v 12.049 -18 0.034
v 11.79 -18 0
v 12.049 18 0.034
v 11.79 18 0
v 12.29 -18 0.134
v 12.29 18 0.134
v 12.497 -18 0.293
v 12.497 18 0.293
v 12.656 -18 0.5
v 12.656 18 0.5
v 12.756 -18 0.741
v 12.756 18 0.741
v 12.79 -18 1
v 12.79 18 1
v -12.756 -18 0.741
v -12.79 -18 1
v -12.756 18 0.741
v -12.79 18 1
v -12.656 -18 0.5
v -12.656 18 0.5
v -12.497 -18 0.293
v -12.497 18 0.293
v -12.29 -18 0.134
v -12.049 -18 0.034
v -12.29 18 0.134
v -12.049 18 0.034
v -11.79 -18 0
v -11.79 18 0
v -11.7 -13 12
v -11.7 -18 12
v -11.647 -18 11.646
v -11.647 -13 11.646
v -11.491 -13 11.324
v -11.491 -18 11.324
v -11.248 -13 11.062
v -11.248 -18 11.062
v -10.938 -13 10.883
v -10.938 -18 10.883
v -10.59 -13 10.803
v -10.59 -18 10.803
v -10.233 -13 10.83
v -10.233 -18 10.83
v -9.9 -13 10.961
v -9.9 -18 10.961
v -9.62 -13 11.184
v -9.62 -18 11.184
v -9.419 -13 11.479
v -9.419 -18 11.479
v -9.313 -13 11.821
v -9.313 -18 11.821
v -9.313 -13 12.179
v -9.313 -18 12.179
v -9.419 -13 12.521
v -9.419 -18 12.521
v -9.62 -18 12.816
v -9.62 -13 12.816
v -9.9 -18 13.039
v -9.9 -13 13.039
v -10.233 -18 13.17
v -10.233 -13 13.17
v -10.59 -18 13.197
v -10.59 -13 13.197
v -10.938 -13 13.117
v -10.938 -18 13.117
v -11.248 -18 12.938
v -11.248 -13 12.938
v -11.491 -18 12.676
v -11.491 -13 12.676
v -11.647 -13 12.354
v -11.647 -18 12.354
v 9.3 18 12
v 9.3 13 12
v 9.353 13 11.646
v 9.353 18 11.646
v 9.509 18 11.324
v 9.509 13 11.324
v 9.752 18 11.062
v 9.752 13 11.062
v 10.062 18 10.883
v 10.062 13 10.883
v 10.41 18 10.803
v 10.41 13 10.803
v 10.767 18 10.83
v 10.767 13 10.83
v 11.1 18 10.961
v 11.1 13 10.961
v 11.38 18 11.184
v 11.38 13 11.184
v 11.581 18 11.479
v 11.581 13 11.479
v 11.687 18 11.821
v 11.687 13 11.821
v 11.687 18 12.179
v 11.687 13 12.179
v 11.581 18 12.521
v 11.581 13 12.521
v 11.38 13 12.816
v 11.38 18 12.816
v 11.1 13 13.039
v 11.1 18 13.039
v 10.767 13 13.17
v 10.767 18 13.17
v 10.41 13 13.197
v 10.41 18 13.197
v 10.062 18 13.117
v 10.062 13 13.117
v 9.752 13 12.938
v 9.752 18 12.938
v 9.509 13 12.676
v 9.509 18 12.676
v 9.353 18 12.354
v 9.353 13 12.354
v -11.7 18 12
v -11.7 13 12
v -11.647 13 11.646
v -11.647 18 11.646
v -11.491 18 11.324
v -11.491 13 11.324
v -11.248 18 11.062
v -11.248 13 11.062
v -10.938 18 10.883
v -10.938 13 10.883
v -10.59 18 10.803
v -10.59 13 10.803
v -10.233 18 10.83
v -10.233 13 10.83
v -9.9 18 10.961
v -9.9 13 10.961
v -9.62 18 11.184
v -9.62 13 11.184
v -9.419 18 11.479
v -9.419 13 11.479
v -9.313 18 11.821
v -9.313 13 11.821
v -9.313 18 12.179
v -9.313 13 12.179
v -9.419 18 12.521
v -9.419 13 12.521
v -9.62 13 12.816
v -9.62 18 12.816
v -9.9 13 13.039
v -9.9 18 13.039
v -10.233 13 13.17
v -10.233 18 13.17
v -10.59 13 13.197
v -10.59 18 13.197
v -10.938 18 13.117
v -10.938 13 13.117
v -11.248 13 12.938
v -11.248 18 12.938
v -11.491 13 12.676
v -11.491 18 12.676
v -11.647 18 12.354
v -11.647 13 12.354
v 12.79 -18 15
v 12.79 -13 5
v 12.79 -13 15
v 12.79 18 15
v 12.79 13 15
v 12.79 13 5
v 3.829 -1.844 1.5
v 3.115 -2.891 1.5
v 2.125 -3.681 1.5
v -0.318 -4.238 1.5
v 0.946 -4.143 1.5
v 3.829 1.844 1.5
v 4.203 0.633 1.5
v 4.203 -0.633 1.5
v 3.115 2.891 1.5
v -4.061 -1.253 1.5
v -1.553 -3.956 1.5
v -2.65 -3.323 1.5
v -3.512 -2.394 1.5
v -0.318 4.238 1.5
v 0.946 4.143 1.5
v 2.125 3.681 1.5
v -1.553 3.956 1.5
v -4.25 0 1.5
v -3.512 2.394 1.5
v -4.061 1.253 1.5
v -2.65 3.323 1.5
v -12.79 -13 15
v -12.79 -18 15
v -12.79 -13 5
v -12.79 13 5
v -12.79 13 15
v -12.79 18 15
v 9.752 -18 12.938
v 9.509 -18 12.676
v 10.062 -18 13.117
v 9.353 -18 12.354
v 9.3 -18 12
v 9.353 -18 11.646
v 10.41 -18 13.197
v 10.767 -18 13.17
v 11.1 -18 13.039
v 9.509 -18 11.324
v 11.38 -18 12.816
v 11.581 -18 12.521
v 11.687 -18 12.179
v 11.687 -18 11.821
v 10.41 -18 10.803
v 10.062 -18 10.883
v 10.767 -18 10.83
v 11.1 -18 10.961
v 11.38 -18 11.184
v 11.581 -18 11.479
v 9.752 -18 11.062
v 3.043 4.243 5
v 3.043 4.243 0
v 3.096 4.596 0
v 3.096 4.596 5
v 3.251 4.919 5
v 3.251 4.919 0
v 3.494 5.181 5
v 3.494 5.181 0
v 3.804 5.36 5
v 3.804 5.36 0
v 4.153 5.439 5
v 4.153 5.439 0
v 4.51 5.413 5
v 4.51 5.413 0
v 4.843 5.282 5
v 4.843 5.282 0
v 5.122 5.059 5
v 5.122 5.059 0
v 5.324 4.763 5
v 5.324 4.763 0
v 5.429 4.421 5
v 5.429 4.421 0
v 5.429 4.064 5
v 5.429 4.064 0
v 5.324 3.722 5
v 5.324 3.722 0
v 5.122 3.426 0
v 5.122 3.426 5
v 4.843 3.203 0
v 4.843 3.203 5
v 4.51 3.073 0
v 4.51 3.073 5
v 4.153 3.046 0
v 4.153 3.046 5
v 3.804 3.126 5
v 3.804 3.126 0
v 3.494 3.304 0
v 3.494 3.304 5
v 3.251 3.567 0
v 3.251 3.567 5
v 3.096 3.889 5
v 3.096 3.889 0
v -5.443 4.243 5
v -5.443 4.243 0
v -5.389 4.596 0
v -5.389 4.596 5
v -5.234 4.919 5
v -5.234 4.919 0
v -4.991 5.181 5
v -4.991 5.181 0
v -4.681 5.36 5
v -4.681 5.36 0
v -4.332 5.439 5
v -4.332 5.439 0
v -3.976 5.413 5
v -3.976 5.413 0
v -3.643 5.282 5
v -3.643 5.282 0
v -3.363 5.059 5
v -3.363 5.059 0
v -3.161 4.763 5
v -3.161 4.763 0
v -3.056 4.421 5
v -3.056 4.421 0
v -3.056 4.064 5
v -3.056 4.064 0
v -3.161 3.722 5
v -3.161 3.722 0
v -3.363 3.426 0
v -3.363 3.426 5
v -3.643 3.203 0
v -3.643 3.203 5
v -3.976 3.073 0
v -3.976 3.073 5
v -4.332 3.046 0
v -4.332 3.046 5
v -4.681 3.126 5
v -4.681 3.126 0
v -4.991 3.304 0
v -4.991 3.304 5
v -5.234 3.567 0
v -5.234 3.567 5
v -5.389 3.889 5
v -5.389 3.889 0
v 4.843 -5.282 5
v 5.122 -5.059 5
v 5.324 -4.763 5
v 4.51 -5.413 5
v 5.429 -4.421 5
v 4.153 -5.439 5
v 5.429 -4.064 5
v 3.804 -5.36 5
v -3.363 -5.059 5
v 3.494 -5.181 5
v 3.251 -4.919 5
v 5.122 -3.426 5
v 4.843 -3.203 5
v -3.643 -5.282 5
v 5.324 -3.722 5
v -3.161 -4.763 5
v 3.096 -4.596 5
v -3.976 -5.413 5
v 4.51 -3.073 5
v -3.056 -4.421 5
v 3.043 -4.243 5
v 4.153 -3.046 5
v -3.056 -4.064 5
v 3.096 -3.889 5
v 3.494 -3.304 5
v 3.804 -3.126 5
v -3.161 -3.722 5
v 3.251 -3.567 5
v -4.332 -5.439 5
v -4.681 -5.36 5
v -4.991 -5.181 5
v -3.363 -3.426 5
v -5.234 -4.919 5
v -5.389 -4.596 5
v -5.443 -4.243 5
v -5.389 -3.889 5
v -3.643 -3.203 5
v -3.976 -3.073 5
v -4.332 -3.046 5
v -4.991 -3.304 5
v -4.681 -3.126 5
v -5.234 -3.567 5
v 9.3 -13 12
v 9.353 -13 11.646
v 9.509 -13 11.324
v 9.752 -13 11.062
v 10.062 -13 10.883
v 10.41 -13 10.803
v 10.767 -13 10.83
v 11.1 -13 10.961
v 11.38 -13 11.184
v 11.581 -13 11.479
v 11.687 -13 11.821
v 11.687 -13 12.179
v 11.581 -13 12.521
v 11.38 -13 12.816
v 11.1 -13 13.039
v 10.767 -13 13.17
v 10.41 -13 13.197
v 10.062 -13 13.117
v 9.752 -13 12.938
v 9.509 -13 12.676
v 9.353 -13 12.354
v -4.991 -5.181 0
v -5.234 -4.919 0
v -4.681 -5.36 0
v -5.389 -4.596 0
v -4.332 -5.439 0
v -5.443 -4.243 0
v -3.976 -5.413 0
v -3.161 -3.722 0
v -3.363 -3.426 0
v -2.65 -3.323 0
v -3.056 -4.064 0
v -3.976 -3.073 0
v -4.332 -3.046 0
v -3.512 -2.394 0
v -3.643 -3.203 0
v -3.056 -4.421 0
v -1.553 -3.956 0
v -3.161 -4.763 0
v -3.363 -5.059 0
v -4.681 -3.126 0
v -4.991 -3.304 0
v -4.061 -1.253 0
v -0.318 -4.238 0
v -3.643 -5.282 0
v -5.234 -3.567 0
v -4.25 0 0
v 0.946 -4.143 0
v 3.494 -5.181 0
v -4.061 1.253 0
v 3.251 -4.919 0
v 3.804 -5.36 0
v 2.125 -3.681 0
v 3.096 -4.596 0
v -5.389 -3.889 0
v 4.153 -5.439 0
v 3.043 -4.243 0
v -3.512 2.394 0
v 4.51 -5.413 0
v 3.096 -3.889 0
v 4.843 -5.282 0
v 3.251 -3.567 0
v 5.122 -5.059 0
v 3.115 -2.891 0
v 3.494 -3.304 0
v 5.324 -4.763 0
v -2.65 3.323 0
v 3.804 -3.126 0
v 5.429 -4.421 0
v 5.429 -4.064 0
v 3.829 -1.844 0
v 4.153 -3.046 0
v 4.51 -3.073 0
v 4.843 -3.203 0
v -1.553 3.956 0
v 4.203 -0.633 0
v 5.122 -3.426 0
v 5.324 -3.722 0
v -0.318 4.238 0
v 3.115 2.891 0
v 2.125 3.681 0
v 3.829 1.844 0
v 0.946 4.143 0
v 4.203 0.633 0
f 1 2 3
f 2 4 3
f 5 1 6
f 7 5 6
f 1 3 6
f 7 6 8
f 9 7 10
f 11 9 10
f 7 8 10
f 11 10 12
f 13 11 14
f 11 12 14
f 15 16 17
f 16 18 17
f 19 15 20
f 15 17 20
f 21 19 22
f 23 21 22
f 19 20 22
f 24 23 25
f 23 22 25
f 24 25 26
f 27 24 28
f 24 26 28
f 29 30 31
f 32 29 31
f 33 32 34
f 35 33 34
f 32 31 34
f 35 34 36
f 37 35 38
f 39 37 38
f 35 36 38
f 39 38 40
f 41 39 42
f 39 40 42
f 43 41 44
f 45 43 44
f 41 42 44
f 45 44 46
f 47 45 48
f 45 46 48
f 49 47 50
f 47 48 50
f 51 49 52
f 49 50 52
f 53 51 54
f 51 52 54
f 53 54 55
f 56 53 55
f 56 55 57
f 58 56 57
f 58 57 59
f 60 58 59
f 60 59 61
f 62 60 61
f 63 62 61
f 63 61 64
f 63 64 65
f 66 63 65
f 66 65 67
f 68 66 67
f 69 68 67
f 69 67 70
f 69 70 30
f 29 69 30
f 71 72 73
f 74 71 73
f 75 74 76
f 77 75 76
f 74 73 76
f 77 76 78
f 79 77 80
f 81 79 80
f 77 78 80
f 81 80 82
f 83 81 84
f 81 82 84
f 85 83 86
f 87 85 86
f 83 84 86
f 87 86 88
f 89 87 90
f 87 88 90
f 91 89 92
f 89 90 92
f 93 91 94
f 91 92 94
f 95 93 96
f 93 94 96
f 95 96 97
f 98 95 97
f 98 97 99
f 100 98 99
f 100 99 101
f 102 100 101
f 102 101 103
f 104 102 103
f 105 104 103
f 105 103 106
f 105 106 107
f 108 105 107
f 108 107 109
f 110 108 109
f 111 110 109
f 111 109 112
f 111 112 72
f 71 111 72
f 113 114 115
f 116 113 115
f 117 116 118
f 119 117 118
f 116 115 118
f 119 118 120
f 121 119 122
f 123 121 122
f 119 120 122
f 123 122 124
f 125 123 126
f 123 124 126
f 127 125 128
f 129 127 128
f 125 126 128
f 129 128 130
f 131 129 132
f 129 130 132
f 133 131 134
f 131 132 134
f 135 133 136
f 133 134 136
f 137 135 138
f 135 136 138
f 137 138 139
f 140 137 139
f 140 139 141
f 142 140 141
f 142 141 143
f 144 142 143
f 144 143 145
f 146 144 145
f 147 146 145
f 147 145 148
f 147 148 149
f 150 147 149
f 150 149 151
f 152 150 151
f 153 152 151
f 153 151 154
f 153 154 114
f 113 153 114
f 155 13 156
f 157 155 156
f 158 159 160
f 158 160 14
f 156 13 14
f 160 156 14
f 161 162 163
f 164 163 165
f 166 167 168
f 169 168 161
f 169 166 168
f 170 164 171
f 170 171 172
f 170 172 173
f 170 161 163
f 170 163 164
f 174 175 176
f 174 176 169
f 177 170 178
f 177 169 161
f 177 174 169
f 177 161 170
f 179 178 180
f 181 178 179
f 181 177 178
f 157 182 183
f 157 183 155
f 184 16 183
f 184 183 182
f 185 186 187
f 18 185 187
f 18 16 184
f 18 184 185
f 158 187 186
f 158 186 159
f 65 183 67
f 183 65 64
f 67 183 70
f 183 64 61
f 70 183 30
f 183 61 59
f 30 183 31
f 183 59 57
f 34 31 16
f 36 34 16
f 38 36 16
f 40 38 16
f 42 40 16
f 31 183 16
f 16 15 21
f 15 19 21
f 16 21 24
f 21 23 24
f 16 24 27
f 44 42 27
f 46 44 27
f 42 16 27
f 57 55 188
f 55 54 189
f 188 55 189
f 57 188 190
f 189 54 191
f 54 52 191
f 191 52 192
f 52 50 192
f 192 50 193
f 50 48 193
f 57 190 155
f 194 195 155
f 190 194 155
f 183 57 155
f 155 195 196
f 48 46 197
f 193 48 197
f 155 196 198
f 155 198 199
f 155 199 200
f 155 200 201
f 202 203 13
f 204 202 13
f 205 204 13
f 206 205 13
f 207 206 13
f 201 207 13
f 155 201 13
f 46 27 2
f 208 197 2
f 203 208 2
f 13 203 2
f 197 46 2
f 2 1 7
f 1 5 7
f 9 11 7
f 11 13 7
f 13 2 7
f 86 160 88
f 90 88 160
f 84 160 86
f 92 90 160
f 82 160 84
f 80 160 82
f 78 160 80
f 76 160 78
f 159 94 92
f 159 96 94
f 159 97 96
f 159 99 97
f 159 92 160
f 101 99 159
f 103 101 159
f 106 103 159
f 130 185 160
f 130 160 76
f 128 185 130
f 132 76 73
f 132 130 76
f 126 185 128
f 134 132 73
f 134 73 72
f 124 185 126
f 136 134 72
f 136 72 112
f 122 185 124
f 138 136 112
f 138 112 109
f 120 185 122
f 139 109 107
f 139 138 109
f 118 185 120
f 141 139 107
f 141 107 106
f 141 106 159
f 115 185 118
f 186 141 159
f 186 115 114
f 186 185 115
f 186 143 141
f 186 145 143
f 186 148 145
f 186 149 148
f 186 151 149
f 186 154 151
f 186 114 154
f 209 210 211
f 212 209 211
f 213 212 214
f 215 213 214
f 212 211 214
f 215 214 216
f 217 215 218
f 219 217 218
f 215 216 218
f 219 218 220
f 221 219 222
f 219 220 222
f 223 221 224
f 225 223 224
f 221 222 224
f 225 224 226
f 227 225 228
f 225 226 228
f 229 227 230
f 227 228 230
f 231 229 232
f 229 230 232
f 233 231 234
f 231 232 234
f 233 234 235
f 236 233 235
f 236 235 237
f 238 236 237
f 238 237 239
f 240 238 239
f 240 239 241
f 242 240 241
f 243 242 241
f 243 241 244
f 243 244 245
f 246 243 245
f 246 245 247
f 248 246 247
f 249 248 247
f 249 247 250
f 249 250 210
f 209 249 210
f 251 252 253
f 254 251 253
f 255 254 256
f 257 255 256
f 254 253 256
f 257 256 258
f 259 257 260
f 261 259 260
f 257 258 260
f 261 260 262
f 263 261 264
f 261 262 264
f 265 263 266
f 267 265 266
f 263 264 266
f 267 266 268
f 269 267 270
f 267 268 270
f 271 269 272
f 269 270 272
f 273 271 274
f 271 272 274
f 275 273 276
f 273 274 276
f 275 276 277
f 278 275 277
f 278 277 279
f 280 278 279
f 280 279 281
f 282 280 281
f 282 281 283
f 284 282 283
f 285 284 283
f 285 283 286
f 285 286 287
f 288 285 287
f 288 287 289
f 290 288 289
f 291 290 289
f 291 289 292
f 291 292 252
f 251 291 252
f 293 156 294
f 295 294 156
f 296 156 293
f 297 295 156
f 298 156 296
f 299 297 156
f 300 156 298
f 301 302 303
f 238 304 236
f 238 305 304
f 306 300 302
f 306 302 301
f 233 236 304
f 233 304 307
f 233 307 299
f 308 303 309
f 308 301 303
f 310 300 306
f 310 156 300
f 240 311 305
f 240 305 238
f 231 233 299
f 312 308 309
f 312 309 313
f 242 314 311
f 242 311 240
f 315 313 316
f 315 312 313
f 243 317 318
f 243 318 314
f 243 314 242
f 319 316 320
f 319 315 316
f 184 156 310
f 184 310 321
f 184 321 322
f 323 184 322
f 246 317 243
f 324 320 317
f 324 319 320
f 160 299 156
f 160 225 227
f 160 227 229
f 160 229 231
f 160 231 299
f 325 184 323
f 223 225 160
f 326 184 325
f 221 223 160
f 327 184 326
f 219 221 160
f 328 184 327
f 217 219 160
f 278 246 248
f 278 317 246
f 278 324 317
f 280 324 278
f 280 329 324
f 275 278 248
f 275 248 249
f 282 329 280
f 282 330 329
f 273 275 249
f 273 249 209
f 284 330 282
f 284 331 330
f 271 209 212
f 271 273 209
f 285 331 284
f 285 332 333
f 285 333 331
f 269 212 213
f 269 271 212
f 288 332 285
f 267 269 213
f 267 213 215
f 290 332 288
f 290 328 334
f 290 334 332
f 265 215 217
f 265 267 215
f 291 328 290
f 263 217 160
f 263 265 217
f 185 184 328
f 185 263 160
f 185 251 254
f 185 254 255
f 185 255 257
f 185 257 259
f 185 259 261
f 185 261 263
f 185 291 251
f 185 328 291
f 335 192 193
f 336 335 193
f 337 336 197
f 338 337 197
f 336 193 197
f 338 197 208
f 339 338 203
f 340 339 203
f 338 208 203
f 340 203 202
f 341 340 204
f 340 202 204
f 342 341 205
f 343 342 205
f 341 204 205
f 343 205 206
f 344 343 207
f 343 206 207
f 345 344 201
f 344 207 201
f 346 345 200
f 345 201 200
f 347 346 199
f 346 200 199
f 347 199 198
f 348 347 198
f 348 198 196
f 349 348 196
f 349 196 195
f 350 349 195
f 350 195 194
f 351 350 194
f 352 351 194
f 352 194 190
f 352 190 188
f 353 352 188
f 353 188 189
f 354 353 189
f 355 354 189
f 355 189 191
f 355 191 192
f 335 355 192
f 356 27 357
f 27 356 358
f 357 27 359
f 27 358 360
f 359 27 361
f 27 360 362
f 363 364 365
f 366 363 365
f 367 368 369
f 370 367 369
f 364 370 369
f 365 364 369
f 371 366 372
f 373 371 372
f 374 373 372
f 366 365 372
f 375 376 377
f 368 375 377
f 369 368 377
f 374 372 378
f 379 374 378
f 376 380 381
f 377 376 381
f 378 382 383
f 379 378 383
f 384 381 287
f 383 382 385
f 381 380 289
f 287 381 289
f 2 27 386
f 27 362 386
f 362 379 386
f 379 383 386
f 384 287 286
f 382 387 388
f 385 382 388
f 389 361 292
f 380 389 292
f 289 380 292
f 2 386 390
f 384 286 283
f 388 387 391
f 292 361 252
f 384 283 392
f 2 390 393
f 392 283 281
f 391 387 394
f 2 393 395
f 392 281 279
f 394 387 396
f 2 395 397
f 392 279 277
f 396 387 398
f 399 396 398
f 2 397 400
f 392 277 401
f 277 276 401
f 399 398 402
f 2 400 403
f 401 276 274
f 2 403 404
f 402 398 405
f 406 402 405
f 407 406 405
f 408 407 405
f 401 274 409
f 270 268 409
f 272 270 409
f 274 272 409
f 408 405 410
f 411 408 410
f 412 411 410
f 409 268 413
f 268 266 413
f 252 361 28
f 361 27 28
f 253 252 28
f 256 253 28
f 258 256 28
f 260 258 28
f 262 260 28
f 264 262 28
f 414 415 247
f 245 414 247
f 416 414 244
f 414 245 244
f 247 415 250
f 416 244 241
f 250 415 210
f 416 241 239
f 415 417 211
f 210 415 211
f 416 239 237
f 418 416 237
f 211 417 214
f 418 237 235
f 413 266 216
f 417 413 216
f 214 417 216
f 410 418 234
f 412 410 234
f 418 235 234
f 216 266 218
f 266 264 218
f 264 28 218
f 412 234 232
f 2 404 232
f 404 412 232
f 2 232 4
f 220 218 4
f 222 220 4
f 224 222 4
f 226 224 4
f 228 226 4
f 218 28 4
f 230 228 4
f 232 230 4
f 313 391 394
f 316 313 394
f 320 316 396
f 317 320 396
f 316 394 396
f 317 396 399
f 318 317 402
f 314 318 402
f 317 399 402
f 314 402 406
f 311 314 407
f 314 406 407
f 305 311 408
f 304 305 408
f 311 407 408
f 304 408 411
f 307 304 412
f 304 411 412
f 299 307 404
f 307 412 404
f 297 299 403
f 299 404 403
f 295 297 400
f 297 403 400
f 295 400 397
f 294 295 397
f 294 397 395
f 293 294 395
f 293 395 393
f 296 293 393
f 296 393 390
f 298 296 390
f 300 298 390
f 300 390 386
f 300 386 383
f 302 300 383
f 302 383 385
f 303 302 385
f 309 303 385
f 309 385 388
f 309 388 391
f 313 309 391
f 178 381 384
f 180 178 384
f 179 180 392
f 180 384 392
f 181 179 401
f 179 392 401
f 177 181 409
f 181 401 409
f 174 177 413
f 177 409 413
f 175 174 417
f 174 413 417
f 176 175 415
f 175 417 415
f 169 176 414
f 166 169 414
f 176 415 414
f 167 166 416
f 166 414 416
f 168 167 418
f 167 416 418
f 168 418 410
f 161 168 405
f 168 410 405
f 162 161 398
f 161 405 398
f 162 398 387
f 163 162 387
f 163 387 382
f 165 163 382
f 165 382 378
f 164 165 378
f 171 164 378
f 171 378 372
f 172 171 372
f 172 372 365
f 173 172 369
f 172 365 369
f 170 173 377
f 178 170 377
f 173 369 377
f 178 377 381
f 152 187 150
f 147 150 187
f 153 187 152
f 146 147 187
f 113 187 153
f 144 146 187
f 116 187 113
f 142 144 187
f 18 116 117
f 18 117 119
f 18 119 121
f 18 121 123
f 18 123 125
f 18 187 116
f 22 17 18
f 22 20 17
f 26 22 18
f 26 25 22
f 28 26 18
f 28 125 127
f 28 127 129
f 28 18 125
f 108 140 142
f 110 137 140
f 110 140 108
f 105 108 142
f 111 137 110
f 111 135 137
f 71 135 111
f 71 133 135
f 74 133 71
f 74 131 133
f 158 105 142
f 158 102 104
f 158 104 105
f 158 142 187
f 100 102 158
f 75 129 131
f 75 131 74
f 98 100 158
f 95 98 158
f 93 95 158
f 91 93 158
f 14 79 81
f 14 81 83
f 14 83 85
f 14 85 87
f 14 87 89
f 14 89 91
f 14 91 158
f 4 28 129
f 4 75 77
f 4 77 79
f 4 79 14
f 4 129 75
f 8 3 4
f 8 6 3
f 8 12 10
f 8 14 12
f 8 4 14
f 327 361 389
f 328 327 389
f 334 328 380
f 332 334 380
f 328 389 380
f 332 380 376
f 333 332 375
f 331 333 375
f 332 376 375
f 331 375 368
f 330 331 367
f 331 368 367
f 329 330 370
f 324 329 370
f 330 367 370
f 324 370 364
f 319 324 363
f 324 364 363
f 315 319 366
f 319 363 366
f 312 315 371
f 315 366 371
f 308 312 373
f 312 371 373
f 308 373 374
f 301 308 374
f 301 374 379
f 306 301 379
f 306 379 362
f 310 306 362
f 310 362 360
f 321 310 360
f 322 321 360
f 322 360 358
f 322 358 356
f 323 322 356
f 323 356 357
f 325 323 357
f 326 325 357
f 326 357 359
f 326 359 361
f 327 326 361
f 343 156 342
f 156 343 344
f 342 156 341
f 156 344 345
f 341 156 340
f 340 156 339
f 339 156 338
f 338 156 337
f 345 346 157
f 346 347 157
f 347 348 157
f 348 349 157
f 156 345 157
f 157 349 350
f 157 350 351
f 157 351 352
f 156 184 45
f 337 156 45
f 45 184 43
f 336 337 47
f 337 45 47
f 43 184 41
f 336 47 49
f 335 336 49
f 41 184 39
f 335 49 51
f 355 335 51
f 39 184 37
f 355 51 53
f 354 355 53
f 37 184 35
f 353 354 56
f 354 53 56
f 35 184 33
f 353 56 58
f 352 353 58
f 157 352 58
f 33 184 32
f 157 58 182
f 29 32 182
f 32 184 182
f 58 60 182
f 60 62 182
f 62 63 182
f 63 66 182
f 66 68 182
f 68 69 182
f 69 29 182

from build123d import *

# Parameters (mm, degrees)
SKETCH_1_W          = 25.58
SKETCH_1_H          = 36
EXTRUDE_1_DEPTH     = 15
SKETCH_2_W          = 10
SKETCH_2_H          = 26
CUT_EXTRUDE_1_DEPTH = 35.689139511
HOLE_WIZARD_M2_1_D  = 2.4
FILLET_1_R          = 1
SKETCH_5_R          = 4.25
CUT_EXTRUDE_2_DEPTH = 1.5
HOLE_WIZARD_M2_2_D  = 2.4


with BuildPart() as part:
    # ｽｹｯﾁ1 → ﾎﾞｽ - 押し出し1 (new body)
    with BuildSketch(Plane.XY):
        Rectangle(SKETCH_1_W, SKETCH_1_H)
    extrude(amount=EXTRUDE_1_DEPTH)

    # ｽｹｯﾁ2 → ｶｯﾄ - 押し出し1 (cut, through all)
    with BuildSketch(Plane.ZY.offset(12.79)):
        with Locations((10, 0)):
            Rectangle(SKETCH_2_W, SKETCH_2_H)
    extrude(amount=-CUT_EXTRUDE_1_DEPTH, mode=Mode.SUBTRACT)

    # M2 すきま穴1 (through all)
    with Locations(Plane(origin=(0, 18, 0), x_dir=(1, 0, 0), z_dir=(0, 1, 0))):
        with Locations((-10.5, -12), (10.5, -12)):
            Hole(HOLE_WIZARD_M2_1_D / 2)

    # ﾌｨﾚｯﾄ1
    fillet_1_edges = [part.edges().sort_by_distance(p)[0] for p in [
        (-12.79, 0, 0),
        (12.79, 0, 0),
    ]]
    fillet(fillet_1_edges, radius=FILLET_1_R)

    # ｽｹｯﾁ5 → ｶｯﾄ - 押し出し2 (cut)
    with BuildSketch(Plane(origin=(0, 0, 0), x_dir=(-1, 0, 0), z_dir=(0, 0, -1))):
        Circle(SKETCH_5_R)
    extrude(amount=-CUT_EXTRUDE_2_DEPTH, mode=Mode.SUBTRACT)

    # M2 すきま穴2 (through all)
    with Locations(Plane.XY.offset(5)):
        with Locations((4.242640687, 4.242640687), (-4.242640687, -4.242640687), (4.242640687, -4.242640687), (-4.242640687, 4.242640687)):
            Hole(HOLE_WIZARD_M2_2_D / 2)


solid = part.part
